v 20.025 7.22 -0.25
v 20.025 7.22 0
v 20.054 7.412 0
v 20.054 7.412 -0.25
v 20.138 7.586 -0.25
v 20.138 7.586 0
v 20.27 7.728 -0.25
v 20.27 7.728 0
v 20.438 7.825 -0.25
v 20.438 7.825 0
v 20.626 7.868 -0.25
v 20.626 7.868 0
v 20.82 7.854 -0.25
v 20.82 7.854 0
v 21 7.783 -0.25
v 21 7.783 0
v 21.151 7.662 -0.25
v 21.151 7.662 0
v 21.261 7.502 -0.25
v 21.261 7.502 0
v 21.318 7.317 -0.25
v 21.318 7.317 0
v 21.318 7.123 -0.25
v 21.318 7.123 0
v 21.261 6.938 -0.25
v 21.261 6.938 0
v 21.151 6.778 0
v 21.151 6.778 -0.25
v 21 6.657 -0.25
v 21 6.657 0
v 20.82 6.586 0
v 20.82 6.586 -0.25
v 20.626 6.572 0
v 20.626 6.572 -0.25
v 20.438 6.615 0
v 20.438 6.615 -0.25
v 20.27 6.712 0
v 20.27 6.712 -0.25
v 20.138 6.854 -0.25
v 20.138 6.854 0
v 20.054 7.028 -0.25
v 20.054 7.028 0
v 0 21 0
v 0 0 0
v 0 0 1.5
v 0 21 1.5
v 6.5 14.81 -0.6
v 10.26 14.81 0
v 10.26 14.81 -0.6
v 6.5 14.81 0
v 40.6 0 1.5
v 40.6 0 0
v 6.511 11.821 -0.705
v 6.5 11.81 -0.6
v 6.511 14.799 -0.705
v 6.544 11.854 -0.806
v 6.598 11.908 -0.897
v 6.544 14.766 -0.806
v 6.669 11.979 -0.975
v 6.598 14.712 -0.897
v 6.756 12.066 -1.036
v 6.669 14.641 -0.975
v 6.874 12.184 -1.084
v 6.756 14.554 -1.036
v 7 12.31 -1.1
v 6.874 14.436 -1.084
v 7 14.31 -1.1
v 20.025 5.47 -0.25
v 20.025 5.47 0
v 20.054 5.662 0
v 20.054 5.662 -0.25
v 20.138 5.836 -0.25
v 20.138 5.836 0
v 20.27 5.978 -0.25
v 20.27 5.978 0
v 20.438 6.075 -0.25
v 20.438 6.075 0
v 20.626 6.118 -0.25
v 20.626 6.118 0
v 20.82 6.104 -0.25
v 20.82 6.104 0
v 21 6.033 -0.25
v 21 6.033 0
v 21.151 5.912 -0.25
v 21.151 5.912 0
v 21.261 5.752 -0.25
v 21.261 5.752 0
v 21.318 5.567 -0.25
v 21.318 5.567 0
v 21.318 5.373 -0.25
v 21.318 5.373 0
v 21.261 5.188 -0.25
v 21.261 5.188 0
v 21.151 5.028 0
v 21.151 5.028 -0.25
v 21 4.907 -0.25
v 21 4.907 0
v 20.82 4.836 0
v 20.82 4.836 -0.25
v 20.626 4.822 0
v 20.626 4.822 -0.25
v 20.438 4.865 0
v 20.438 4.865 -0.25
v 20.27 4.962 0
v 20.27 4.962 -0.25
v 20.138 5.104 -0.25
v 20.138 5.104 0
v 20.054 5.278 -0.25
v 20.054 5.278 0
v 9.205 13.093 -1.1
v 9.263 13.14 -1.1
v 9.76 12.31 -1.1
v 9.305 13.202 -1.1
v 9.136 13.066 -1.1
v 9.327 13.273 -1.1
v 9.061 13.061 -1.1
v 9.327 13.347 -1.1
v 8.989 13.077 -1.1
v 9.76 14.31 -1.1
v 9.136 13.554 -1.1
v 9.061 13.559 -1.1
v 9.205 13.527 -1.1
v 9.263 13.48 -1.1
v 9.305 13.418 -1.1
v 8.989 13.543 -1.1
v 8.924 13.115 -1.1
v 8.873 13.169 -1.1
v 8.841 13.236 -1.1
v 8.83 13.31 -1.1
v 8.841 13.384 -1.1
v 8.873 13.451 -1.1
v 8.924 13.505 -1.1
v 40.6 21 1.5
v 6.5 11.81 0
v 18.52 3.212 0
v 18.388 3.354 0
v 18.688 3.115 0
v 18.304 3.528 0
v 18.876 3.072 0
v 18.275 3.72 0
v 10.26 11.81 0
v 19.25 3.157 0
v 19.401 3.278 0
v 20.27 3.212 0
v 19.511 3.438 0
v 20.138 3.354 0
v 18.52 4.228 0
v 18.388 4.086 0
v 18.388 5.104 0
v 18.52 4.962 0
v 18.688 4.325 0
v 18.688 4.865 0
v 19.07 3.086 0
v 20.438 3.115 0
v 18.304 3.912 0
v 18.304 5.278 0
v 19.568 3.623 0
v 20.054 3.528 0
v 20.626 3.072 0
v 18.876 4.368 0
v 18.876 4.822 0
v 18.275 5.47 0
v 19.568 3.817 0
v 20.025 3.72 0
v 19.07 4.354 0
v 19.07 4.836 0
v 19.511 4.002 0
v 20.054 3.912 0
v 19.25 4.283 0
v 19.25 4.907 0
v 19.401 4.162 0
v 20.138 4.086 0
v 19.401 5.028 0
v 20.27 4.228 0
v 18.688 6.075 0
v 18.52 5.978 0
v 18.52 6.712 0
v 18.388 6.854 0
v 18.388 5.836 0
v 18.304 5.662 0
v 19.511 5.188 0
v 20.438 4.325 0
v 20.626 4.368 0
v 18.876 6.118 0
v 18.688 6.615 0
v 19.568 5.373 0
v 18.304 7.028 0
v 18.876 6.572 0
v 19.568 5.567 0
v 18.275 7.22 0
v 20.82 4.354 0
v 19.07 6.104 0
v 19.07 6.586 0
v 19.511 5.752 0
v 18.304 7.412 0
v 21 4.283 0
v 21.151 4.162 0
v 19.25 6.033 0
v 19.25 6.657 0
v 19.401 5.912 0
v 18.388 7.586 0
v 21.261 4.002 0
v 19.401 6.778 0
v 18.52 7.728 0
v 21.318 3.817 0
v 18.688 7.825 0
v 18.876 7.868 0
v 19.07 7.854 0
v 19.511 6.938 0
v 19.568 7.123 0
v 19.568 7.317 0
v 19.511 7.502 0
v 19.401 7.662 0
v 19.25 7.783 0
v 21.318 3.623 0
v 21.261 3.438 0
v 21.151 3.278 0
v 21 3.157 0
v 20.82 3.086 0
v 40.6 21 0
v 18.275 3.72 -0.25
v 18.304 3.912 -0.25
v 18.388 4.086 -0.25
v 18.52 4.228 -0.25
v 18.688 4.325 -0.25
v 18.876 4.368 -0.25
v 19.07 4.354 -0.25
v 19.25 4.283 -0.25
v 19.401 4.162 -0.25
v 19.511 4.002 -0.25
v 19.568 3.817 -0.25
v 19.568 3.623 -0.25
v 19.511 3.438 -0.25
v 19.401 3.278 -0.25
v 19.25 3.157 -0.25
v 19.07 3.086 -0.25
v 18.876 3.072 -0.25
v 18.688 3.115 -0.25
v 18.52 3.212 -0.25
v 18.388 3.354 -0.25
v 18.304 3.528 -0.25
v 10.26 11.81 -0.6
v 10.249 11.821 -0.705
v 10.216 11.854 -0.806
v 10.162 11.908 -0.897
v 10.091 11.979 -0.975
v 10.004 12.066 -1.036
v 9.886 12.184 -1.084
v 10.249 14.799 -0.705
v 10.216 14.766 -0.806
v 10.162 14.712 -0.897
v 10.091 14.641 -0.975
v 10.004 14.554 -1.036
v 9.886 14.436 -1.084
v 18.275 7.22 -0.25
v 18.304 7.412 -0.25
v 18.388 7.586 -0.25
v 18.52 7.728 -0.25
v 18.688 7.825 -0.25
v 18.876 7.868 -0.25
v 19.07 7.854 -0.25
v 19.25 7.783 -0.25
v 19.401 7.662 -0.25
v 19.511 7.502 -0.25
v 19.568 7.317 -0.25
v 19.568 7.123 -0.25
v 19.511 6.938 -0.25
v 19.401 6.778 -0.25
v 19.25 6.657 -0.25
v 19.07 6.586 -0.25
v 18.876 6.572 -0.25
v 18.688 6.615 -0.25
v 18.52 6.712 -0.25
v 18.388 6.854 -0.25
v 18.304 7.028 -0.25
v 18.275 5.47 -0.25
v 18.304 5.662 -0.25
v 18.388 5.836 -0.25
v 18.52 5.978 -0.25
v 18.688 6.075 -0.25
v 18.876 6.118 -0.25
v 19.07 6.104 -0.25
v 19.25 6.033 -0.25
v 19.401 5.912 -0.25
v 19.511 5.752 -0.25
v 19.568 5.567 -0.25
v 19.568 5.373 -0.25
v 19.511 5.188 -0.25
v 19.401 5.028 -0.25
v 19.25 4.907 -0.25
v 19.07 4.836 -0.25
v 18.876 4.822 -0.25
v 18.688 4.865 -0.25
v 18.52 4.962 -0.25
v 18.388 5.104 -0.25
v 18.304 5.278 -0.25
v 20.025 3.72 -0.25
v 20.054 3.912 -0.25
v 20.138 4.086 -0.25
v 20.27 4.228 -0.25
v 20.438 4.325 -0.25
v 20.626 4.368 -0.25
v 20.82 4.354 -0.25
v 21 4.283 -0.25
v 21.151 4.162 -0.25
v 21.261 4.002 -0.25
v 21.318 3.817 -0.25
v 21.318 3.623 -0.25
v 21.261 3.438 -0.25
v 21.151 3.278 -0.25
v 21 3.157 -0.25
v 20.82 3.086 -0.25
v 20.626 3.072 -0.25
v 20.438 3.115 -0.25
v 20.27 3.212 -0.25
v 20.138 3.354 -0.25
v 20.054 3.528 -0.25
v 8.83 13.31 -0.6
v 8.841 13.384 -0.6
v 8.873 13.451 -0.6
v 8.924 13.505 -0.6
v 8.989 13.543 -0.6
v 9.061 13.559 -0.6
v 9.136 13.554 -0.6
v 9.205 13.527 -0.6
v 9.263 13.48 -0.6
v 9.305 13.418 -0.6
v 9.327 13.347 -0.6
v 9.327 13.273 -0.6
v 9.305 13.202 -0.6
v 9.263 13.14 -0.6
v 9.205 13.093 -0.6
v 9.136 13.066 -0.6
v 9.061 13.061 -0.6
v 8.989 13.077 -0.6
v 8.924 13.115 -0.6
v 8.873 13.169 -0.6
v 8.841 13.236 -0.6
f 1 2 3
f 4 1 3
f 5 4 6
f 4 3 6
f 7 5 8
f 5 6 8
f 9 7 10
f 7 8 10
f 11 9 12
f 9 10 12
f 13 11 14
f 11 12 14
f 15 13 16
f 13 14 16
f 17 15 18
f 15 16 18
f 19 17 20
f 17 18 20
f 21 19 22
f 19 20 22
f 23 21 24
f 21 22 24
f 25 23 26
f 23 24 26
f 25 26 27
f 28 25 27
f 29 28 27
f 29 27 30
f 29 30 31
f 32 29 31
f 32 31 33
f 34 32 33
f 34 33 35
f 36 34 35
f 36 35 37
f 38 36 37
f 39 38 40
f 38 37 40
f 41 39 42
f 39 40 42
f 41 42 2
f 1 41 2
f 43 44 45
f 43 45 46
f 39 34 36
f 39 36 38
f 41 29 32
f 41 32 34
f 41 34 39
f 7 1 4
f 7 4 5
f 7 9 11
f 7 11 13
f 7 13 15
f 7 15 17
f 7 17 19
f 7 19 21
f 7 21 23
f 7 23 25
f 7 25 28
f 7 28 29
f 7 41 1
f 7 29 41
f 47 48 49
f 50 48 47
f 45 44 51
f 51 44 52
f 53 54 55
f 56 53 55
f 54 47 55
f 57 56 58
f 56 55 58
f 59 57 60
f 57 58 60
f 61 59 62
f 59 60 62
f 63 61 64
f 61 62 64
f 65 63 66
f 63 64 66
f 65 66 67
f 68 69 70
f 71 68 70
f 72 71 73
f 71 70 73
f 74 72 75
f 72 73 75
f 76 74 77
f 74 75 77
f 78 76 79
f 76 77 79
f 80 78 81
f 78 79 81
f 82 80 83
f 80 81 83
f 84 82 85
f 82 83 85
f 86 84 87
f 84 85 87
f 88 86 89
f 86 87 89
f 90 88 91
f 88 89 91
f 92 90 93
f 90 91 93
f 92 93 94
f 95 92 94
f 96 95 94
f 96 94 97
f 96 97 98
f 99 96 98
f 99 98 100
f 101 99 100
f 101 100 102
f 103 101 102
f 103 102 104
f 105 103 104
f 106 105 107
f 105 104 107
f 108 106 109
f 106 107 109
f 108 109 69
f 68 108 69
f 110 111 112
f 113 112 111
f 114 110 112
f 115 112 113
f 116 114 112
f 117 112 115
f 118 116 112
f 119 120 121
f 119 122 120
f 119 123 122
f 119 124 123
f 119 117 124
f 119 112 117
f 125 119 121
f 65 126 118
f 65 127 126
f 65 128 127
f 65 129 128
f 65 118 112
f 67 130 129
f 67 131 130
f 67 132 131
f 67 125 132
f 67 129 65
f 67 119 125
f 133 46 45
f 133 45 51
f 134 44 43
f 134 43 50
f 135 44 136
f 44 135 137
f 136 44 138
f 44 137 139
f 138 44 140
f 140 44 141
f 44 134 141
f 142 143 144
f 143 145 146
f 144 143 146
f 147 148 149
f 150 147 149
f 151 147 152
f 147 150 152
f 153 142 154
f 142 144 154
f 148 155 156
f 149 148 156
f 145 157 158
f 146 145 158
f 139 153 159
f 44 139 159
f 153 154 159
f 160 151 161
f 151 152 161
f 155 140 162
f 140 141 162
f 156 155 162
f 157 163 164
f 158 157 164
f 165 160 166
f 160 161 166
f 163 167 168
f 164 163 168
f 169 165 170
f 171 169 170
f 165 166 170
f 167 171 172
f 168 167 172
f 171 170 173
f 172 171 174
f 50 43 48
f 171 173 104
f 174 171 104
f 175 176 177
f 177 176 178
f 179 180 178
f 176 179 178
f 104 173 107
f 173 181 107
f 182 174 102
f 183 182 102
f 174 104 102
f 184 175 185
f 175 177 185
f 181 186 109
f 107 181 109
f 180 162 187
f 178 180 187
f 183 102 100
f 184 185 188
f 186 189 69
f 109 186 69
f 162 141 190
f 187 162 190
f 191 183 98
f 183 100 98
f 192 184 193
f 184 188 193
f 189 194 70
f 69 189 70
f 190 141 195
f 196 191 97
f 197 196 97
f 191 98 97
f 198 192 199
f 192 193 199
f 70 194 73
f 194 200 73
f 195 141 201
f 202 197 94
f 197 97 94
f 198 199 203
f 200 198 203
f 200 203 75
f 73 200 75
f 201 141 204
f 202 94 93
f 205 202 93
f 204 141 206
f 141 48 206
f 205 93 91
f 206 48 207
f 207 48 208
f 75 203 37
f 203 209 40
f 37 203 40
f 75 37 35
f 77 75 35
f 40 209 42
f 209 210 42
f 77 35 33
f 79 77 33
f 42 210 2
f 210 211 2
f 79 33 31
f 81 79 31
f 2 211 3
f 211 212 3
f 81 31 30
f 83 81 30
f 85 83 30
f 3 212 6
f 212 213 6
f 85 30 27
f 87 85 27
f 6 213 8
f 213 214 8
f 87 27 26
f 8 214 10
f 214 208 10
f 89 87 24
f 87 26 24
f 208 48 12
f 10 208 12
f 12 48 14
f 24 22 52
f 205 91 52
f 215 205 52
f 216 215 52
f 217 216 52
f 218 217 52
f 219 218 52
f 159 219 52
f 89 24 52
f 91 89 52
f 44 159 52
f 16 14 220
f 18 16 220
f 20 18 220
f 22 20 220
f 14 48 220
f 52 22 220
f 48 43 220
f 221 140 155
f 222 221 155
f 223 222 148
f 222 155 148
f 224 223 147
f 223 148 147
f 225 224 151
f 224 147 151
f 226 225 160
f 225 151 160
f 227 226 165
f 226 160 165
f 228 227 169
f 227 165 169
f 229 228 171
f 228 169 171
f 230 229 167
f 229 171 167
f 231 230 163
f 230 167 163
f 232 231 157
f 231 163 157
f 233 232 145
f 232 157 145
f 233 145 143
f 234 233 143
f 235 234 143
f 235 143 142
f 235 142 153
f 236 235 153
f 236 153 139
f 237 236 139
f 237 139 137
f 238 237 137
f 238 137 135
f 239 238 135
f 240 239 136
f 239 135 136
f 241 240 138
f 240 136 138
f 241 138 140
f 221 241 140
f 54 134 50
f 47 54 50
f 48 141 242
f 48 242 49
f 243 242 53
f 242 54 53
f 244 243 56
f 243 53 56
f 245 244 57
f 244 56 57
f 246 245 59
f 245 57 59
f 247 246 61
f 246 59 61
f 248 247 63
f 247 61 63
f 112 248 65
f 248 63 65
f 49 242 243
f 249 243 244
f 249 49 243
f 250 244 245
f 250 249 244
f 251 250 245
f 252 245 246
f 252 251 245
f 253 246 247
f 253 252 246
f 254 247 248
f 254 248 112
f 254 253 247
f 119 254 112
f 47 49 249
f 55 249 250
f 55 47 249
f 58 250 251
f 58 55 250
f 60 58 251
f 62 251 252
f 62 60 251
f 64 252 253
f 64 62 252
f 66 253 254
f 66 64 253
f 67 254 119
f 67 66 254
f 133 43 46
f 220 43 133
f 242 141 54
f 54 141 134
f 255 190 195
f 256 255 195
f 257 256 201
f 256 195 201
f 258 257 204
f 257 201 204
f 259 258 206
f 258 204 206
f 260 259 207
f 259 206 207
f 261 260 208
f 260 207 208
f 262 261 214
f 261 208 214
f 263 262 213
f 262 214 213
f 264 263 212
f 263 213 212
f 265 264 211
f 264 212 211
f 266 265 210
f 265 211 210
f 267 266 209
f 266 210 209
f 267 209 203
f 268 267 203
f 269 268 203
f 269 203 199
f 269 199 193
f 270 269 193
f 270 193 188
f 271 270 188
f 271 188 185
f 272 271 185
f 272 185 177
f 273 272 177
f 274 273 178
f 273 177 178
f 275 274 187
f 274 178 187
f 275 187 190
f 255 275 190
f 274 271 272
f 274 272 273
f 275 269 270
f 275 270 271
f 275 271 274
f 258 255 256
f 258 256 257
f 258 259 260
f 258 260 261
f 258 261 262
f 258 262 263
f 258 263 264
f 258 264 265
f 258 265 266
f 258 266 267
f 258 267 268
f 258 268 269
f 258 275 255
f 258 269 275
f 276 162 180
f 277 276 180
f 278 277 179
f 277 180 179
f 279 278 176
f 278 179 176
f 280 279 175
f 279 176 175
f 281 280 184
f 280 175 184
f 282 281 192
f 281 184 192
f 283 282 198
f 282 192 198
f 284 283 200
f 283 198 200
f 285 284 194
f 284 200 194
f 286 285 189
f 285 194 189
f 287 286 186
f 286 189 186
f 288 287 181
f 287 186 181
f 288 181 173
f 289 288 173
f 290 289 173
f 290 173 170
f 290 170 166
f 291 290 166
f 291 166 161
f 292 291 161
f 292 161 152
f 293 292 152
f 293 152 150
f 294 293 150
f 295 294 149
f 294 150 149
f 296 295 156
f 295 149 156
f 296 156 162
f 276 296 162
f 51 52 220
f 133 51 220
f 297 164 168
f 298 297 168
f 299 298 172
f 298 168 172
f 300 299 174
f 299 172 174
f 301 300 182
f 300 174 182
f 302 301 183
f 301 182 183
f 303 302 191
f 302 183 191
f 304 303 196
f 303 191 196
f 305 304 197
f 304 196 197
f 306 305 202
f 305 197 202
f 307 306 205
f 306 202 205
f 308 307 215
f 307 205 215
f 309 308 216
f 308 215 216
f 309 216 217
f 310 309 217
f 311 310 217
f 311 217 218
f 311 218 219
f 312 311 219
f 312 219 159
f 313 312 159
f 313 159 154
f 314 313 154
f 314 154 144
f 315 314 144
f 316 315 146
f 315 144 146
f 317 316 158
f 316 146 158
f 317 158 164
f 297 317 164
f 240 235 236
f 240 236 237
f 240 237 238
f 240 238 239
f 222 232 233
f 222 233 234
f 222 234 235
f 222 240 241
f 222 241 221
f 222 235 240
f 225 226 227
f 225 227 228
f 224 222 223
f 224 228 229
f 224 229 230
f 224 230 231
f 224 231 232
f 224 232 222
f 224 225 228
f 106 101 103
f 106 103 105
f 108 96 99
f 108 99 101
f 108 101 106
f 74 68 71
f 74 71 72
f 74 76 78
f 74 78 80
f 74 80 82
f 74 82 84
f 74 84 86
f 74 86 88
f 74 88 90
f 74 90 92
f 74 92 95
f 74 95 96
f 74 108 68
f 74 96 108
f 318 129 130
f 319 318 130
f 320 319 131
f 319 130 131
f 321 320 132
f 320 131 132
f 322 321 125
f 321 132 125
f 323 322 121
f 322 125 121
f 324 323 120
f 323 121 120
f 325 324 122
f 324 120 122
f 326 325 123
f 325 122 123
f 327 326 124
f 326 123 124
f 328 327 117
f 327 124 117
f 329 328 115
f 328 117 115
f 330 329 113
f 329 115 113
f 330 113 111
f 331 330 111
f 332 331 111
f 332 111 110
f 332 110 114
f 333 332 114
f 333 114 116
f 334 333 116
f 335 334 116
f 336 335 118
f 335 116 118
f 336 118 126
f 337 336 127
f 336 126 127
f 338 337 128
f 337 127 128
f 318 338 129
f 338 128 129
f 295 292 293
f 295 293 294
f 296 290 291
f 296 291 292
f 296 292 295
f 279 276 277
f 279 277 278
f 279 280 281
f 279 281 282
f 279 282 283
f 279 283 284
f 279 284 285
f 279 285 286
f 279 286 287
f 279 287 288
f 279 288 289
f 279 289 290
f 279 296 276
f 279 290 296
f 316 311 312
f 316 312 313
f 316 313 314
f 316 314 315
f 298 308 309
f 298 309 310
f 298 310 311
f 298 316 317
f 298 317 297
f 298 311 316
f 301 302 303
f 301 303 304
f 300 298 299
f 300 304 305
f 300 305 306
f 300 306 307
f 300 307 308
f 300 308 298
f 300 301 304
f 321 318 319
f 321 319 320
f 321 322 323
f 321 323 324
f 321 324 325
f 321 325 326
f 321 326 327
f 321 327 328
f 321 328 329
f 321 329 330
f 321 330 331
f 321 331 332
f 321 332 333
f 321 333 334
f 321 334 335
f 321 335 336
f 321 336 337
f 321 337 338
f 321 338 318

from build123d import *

# Parameters (mm, degrees)
SKETCH1_W           = 40.6
SKETCH1_H           = 21
BOSS_EXTRUDE1_DEPTH = 1.5
SKETCH2_W           = 3.76
SKETCH2_H           = 3
BOSS_EXTRUDE3_DEPTH = 1.1
SKETCH3_R           = 0.25
CUT_EXTRUDE1_DEPTH  = 0.5
FILLET3_R           = 0.5
SKETCH4_R           = 0.65
BOSS_EXTRUDE4_DEPTH = 0.25


with BuildPart() as part:
    # Sketch1 → Boss-Extrude1 (new body)
    with BuildSketch(Plane.XY):
        with Locations((20.3, 10.5)):
            Rectangle(SKETCH1_W, SKETCH1_H)
    extrude(amount=BOSS_EXTRUDE1_DEPTH)

    # Sketch2 → Boss-Extrude3 (add)
    with BuildSketch(Plane(origin=(0, 0, 0), x_dir=(-1, 0, 0), z_dir=(0, 0, -1))):
        with Locations((-8.38, 13.31)):
            Rectangle(SKETCH2_W, SKETCH2_H)
    extrude(amount=BOSS_EXTRUDE3_DEPTH)

    # Sketch3 → Cut-Extrude1 (cut)
    with BuildSketch(Plane(origin=(0, 0, -1.1), x_dir=(-1, 0, 0), z_dir=(0, 0, -1))):
        with Locations((-9.08, 13.31)):
            Circle(SKETCH3_R)
    extrude(amount=-CUT_EXTRUDE1_DEPTH, mode=Mode.SUBTRACT)

    # Fillet3
    fillet3_edges = [part.edges().sort_by_distance(p)[0] for p in [
        (6.5, 13.31, -1.1),
        (8.38, 14.81, -1.1),
        (10.26, 13.31, -1.1),
        (8.38, 11.81, -1.1),
    ]]
    fillet(fillet3_edges, radius=FILLET3_R)

    # Sketch4 → Boss-Extrude4 (add)
    with BuildSketch(Plane(origin=(0, 0, 0), x_dir=(-1, 0, 0), z_dir=(0, 0, -1))):
        with Locations((-18.925, 3.72)):
            Circle(SKETCH4_R)
        with Locations((-20.675, 3.72)):
            Circle(SKETCH4_R)
        with Locations((-20.675, 5.47)):
            Circle(SKETCH4_R)
        with Locations((-20.675, 7.22)):
            Circle(SKETCH4_R)
        with Locations((-18.925, 5.47)):
            Circle(SKETCH4_R)
        with Locations((-18.925, 7.22)):
            Circle(SKETCH4_R)
    extrude(amount=BOSS_EXTRUDE4_DEPTH)


solid = part.part
